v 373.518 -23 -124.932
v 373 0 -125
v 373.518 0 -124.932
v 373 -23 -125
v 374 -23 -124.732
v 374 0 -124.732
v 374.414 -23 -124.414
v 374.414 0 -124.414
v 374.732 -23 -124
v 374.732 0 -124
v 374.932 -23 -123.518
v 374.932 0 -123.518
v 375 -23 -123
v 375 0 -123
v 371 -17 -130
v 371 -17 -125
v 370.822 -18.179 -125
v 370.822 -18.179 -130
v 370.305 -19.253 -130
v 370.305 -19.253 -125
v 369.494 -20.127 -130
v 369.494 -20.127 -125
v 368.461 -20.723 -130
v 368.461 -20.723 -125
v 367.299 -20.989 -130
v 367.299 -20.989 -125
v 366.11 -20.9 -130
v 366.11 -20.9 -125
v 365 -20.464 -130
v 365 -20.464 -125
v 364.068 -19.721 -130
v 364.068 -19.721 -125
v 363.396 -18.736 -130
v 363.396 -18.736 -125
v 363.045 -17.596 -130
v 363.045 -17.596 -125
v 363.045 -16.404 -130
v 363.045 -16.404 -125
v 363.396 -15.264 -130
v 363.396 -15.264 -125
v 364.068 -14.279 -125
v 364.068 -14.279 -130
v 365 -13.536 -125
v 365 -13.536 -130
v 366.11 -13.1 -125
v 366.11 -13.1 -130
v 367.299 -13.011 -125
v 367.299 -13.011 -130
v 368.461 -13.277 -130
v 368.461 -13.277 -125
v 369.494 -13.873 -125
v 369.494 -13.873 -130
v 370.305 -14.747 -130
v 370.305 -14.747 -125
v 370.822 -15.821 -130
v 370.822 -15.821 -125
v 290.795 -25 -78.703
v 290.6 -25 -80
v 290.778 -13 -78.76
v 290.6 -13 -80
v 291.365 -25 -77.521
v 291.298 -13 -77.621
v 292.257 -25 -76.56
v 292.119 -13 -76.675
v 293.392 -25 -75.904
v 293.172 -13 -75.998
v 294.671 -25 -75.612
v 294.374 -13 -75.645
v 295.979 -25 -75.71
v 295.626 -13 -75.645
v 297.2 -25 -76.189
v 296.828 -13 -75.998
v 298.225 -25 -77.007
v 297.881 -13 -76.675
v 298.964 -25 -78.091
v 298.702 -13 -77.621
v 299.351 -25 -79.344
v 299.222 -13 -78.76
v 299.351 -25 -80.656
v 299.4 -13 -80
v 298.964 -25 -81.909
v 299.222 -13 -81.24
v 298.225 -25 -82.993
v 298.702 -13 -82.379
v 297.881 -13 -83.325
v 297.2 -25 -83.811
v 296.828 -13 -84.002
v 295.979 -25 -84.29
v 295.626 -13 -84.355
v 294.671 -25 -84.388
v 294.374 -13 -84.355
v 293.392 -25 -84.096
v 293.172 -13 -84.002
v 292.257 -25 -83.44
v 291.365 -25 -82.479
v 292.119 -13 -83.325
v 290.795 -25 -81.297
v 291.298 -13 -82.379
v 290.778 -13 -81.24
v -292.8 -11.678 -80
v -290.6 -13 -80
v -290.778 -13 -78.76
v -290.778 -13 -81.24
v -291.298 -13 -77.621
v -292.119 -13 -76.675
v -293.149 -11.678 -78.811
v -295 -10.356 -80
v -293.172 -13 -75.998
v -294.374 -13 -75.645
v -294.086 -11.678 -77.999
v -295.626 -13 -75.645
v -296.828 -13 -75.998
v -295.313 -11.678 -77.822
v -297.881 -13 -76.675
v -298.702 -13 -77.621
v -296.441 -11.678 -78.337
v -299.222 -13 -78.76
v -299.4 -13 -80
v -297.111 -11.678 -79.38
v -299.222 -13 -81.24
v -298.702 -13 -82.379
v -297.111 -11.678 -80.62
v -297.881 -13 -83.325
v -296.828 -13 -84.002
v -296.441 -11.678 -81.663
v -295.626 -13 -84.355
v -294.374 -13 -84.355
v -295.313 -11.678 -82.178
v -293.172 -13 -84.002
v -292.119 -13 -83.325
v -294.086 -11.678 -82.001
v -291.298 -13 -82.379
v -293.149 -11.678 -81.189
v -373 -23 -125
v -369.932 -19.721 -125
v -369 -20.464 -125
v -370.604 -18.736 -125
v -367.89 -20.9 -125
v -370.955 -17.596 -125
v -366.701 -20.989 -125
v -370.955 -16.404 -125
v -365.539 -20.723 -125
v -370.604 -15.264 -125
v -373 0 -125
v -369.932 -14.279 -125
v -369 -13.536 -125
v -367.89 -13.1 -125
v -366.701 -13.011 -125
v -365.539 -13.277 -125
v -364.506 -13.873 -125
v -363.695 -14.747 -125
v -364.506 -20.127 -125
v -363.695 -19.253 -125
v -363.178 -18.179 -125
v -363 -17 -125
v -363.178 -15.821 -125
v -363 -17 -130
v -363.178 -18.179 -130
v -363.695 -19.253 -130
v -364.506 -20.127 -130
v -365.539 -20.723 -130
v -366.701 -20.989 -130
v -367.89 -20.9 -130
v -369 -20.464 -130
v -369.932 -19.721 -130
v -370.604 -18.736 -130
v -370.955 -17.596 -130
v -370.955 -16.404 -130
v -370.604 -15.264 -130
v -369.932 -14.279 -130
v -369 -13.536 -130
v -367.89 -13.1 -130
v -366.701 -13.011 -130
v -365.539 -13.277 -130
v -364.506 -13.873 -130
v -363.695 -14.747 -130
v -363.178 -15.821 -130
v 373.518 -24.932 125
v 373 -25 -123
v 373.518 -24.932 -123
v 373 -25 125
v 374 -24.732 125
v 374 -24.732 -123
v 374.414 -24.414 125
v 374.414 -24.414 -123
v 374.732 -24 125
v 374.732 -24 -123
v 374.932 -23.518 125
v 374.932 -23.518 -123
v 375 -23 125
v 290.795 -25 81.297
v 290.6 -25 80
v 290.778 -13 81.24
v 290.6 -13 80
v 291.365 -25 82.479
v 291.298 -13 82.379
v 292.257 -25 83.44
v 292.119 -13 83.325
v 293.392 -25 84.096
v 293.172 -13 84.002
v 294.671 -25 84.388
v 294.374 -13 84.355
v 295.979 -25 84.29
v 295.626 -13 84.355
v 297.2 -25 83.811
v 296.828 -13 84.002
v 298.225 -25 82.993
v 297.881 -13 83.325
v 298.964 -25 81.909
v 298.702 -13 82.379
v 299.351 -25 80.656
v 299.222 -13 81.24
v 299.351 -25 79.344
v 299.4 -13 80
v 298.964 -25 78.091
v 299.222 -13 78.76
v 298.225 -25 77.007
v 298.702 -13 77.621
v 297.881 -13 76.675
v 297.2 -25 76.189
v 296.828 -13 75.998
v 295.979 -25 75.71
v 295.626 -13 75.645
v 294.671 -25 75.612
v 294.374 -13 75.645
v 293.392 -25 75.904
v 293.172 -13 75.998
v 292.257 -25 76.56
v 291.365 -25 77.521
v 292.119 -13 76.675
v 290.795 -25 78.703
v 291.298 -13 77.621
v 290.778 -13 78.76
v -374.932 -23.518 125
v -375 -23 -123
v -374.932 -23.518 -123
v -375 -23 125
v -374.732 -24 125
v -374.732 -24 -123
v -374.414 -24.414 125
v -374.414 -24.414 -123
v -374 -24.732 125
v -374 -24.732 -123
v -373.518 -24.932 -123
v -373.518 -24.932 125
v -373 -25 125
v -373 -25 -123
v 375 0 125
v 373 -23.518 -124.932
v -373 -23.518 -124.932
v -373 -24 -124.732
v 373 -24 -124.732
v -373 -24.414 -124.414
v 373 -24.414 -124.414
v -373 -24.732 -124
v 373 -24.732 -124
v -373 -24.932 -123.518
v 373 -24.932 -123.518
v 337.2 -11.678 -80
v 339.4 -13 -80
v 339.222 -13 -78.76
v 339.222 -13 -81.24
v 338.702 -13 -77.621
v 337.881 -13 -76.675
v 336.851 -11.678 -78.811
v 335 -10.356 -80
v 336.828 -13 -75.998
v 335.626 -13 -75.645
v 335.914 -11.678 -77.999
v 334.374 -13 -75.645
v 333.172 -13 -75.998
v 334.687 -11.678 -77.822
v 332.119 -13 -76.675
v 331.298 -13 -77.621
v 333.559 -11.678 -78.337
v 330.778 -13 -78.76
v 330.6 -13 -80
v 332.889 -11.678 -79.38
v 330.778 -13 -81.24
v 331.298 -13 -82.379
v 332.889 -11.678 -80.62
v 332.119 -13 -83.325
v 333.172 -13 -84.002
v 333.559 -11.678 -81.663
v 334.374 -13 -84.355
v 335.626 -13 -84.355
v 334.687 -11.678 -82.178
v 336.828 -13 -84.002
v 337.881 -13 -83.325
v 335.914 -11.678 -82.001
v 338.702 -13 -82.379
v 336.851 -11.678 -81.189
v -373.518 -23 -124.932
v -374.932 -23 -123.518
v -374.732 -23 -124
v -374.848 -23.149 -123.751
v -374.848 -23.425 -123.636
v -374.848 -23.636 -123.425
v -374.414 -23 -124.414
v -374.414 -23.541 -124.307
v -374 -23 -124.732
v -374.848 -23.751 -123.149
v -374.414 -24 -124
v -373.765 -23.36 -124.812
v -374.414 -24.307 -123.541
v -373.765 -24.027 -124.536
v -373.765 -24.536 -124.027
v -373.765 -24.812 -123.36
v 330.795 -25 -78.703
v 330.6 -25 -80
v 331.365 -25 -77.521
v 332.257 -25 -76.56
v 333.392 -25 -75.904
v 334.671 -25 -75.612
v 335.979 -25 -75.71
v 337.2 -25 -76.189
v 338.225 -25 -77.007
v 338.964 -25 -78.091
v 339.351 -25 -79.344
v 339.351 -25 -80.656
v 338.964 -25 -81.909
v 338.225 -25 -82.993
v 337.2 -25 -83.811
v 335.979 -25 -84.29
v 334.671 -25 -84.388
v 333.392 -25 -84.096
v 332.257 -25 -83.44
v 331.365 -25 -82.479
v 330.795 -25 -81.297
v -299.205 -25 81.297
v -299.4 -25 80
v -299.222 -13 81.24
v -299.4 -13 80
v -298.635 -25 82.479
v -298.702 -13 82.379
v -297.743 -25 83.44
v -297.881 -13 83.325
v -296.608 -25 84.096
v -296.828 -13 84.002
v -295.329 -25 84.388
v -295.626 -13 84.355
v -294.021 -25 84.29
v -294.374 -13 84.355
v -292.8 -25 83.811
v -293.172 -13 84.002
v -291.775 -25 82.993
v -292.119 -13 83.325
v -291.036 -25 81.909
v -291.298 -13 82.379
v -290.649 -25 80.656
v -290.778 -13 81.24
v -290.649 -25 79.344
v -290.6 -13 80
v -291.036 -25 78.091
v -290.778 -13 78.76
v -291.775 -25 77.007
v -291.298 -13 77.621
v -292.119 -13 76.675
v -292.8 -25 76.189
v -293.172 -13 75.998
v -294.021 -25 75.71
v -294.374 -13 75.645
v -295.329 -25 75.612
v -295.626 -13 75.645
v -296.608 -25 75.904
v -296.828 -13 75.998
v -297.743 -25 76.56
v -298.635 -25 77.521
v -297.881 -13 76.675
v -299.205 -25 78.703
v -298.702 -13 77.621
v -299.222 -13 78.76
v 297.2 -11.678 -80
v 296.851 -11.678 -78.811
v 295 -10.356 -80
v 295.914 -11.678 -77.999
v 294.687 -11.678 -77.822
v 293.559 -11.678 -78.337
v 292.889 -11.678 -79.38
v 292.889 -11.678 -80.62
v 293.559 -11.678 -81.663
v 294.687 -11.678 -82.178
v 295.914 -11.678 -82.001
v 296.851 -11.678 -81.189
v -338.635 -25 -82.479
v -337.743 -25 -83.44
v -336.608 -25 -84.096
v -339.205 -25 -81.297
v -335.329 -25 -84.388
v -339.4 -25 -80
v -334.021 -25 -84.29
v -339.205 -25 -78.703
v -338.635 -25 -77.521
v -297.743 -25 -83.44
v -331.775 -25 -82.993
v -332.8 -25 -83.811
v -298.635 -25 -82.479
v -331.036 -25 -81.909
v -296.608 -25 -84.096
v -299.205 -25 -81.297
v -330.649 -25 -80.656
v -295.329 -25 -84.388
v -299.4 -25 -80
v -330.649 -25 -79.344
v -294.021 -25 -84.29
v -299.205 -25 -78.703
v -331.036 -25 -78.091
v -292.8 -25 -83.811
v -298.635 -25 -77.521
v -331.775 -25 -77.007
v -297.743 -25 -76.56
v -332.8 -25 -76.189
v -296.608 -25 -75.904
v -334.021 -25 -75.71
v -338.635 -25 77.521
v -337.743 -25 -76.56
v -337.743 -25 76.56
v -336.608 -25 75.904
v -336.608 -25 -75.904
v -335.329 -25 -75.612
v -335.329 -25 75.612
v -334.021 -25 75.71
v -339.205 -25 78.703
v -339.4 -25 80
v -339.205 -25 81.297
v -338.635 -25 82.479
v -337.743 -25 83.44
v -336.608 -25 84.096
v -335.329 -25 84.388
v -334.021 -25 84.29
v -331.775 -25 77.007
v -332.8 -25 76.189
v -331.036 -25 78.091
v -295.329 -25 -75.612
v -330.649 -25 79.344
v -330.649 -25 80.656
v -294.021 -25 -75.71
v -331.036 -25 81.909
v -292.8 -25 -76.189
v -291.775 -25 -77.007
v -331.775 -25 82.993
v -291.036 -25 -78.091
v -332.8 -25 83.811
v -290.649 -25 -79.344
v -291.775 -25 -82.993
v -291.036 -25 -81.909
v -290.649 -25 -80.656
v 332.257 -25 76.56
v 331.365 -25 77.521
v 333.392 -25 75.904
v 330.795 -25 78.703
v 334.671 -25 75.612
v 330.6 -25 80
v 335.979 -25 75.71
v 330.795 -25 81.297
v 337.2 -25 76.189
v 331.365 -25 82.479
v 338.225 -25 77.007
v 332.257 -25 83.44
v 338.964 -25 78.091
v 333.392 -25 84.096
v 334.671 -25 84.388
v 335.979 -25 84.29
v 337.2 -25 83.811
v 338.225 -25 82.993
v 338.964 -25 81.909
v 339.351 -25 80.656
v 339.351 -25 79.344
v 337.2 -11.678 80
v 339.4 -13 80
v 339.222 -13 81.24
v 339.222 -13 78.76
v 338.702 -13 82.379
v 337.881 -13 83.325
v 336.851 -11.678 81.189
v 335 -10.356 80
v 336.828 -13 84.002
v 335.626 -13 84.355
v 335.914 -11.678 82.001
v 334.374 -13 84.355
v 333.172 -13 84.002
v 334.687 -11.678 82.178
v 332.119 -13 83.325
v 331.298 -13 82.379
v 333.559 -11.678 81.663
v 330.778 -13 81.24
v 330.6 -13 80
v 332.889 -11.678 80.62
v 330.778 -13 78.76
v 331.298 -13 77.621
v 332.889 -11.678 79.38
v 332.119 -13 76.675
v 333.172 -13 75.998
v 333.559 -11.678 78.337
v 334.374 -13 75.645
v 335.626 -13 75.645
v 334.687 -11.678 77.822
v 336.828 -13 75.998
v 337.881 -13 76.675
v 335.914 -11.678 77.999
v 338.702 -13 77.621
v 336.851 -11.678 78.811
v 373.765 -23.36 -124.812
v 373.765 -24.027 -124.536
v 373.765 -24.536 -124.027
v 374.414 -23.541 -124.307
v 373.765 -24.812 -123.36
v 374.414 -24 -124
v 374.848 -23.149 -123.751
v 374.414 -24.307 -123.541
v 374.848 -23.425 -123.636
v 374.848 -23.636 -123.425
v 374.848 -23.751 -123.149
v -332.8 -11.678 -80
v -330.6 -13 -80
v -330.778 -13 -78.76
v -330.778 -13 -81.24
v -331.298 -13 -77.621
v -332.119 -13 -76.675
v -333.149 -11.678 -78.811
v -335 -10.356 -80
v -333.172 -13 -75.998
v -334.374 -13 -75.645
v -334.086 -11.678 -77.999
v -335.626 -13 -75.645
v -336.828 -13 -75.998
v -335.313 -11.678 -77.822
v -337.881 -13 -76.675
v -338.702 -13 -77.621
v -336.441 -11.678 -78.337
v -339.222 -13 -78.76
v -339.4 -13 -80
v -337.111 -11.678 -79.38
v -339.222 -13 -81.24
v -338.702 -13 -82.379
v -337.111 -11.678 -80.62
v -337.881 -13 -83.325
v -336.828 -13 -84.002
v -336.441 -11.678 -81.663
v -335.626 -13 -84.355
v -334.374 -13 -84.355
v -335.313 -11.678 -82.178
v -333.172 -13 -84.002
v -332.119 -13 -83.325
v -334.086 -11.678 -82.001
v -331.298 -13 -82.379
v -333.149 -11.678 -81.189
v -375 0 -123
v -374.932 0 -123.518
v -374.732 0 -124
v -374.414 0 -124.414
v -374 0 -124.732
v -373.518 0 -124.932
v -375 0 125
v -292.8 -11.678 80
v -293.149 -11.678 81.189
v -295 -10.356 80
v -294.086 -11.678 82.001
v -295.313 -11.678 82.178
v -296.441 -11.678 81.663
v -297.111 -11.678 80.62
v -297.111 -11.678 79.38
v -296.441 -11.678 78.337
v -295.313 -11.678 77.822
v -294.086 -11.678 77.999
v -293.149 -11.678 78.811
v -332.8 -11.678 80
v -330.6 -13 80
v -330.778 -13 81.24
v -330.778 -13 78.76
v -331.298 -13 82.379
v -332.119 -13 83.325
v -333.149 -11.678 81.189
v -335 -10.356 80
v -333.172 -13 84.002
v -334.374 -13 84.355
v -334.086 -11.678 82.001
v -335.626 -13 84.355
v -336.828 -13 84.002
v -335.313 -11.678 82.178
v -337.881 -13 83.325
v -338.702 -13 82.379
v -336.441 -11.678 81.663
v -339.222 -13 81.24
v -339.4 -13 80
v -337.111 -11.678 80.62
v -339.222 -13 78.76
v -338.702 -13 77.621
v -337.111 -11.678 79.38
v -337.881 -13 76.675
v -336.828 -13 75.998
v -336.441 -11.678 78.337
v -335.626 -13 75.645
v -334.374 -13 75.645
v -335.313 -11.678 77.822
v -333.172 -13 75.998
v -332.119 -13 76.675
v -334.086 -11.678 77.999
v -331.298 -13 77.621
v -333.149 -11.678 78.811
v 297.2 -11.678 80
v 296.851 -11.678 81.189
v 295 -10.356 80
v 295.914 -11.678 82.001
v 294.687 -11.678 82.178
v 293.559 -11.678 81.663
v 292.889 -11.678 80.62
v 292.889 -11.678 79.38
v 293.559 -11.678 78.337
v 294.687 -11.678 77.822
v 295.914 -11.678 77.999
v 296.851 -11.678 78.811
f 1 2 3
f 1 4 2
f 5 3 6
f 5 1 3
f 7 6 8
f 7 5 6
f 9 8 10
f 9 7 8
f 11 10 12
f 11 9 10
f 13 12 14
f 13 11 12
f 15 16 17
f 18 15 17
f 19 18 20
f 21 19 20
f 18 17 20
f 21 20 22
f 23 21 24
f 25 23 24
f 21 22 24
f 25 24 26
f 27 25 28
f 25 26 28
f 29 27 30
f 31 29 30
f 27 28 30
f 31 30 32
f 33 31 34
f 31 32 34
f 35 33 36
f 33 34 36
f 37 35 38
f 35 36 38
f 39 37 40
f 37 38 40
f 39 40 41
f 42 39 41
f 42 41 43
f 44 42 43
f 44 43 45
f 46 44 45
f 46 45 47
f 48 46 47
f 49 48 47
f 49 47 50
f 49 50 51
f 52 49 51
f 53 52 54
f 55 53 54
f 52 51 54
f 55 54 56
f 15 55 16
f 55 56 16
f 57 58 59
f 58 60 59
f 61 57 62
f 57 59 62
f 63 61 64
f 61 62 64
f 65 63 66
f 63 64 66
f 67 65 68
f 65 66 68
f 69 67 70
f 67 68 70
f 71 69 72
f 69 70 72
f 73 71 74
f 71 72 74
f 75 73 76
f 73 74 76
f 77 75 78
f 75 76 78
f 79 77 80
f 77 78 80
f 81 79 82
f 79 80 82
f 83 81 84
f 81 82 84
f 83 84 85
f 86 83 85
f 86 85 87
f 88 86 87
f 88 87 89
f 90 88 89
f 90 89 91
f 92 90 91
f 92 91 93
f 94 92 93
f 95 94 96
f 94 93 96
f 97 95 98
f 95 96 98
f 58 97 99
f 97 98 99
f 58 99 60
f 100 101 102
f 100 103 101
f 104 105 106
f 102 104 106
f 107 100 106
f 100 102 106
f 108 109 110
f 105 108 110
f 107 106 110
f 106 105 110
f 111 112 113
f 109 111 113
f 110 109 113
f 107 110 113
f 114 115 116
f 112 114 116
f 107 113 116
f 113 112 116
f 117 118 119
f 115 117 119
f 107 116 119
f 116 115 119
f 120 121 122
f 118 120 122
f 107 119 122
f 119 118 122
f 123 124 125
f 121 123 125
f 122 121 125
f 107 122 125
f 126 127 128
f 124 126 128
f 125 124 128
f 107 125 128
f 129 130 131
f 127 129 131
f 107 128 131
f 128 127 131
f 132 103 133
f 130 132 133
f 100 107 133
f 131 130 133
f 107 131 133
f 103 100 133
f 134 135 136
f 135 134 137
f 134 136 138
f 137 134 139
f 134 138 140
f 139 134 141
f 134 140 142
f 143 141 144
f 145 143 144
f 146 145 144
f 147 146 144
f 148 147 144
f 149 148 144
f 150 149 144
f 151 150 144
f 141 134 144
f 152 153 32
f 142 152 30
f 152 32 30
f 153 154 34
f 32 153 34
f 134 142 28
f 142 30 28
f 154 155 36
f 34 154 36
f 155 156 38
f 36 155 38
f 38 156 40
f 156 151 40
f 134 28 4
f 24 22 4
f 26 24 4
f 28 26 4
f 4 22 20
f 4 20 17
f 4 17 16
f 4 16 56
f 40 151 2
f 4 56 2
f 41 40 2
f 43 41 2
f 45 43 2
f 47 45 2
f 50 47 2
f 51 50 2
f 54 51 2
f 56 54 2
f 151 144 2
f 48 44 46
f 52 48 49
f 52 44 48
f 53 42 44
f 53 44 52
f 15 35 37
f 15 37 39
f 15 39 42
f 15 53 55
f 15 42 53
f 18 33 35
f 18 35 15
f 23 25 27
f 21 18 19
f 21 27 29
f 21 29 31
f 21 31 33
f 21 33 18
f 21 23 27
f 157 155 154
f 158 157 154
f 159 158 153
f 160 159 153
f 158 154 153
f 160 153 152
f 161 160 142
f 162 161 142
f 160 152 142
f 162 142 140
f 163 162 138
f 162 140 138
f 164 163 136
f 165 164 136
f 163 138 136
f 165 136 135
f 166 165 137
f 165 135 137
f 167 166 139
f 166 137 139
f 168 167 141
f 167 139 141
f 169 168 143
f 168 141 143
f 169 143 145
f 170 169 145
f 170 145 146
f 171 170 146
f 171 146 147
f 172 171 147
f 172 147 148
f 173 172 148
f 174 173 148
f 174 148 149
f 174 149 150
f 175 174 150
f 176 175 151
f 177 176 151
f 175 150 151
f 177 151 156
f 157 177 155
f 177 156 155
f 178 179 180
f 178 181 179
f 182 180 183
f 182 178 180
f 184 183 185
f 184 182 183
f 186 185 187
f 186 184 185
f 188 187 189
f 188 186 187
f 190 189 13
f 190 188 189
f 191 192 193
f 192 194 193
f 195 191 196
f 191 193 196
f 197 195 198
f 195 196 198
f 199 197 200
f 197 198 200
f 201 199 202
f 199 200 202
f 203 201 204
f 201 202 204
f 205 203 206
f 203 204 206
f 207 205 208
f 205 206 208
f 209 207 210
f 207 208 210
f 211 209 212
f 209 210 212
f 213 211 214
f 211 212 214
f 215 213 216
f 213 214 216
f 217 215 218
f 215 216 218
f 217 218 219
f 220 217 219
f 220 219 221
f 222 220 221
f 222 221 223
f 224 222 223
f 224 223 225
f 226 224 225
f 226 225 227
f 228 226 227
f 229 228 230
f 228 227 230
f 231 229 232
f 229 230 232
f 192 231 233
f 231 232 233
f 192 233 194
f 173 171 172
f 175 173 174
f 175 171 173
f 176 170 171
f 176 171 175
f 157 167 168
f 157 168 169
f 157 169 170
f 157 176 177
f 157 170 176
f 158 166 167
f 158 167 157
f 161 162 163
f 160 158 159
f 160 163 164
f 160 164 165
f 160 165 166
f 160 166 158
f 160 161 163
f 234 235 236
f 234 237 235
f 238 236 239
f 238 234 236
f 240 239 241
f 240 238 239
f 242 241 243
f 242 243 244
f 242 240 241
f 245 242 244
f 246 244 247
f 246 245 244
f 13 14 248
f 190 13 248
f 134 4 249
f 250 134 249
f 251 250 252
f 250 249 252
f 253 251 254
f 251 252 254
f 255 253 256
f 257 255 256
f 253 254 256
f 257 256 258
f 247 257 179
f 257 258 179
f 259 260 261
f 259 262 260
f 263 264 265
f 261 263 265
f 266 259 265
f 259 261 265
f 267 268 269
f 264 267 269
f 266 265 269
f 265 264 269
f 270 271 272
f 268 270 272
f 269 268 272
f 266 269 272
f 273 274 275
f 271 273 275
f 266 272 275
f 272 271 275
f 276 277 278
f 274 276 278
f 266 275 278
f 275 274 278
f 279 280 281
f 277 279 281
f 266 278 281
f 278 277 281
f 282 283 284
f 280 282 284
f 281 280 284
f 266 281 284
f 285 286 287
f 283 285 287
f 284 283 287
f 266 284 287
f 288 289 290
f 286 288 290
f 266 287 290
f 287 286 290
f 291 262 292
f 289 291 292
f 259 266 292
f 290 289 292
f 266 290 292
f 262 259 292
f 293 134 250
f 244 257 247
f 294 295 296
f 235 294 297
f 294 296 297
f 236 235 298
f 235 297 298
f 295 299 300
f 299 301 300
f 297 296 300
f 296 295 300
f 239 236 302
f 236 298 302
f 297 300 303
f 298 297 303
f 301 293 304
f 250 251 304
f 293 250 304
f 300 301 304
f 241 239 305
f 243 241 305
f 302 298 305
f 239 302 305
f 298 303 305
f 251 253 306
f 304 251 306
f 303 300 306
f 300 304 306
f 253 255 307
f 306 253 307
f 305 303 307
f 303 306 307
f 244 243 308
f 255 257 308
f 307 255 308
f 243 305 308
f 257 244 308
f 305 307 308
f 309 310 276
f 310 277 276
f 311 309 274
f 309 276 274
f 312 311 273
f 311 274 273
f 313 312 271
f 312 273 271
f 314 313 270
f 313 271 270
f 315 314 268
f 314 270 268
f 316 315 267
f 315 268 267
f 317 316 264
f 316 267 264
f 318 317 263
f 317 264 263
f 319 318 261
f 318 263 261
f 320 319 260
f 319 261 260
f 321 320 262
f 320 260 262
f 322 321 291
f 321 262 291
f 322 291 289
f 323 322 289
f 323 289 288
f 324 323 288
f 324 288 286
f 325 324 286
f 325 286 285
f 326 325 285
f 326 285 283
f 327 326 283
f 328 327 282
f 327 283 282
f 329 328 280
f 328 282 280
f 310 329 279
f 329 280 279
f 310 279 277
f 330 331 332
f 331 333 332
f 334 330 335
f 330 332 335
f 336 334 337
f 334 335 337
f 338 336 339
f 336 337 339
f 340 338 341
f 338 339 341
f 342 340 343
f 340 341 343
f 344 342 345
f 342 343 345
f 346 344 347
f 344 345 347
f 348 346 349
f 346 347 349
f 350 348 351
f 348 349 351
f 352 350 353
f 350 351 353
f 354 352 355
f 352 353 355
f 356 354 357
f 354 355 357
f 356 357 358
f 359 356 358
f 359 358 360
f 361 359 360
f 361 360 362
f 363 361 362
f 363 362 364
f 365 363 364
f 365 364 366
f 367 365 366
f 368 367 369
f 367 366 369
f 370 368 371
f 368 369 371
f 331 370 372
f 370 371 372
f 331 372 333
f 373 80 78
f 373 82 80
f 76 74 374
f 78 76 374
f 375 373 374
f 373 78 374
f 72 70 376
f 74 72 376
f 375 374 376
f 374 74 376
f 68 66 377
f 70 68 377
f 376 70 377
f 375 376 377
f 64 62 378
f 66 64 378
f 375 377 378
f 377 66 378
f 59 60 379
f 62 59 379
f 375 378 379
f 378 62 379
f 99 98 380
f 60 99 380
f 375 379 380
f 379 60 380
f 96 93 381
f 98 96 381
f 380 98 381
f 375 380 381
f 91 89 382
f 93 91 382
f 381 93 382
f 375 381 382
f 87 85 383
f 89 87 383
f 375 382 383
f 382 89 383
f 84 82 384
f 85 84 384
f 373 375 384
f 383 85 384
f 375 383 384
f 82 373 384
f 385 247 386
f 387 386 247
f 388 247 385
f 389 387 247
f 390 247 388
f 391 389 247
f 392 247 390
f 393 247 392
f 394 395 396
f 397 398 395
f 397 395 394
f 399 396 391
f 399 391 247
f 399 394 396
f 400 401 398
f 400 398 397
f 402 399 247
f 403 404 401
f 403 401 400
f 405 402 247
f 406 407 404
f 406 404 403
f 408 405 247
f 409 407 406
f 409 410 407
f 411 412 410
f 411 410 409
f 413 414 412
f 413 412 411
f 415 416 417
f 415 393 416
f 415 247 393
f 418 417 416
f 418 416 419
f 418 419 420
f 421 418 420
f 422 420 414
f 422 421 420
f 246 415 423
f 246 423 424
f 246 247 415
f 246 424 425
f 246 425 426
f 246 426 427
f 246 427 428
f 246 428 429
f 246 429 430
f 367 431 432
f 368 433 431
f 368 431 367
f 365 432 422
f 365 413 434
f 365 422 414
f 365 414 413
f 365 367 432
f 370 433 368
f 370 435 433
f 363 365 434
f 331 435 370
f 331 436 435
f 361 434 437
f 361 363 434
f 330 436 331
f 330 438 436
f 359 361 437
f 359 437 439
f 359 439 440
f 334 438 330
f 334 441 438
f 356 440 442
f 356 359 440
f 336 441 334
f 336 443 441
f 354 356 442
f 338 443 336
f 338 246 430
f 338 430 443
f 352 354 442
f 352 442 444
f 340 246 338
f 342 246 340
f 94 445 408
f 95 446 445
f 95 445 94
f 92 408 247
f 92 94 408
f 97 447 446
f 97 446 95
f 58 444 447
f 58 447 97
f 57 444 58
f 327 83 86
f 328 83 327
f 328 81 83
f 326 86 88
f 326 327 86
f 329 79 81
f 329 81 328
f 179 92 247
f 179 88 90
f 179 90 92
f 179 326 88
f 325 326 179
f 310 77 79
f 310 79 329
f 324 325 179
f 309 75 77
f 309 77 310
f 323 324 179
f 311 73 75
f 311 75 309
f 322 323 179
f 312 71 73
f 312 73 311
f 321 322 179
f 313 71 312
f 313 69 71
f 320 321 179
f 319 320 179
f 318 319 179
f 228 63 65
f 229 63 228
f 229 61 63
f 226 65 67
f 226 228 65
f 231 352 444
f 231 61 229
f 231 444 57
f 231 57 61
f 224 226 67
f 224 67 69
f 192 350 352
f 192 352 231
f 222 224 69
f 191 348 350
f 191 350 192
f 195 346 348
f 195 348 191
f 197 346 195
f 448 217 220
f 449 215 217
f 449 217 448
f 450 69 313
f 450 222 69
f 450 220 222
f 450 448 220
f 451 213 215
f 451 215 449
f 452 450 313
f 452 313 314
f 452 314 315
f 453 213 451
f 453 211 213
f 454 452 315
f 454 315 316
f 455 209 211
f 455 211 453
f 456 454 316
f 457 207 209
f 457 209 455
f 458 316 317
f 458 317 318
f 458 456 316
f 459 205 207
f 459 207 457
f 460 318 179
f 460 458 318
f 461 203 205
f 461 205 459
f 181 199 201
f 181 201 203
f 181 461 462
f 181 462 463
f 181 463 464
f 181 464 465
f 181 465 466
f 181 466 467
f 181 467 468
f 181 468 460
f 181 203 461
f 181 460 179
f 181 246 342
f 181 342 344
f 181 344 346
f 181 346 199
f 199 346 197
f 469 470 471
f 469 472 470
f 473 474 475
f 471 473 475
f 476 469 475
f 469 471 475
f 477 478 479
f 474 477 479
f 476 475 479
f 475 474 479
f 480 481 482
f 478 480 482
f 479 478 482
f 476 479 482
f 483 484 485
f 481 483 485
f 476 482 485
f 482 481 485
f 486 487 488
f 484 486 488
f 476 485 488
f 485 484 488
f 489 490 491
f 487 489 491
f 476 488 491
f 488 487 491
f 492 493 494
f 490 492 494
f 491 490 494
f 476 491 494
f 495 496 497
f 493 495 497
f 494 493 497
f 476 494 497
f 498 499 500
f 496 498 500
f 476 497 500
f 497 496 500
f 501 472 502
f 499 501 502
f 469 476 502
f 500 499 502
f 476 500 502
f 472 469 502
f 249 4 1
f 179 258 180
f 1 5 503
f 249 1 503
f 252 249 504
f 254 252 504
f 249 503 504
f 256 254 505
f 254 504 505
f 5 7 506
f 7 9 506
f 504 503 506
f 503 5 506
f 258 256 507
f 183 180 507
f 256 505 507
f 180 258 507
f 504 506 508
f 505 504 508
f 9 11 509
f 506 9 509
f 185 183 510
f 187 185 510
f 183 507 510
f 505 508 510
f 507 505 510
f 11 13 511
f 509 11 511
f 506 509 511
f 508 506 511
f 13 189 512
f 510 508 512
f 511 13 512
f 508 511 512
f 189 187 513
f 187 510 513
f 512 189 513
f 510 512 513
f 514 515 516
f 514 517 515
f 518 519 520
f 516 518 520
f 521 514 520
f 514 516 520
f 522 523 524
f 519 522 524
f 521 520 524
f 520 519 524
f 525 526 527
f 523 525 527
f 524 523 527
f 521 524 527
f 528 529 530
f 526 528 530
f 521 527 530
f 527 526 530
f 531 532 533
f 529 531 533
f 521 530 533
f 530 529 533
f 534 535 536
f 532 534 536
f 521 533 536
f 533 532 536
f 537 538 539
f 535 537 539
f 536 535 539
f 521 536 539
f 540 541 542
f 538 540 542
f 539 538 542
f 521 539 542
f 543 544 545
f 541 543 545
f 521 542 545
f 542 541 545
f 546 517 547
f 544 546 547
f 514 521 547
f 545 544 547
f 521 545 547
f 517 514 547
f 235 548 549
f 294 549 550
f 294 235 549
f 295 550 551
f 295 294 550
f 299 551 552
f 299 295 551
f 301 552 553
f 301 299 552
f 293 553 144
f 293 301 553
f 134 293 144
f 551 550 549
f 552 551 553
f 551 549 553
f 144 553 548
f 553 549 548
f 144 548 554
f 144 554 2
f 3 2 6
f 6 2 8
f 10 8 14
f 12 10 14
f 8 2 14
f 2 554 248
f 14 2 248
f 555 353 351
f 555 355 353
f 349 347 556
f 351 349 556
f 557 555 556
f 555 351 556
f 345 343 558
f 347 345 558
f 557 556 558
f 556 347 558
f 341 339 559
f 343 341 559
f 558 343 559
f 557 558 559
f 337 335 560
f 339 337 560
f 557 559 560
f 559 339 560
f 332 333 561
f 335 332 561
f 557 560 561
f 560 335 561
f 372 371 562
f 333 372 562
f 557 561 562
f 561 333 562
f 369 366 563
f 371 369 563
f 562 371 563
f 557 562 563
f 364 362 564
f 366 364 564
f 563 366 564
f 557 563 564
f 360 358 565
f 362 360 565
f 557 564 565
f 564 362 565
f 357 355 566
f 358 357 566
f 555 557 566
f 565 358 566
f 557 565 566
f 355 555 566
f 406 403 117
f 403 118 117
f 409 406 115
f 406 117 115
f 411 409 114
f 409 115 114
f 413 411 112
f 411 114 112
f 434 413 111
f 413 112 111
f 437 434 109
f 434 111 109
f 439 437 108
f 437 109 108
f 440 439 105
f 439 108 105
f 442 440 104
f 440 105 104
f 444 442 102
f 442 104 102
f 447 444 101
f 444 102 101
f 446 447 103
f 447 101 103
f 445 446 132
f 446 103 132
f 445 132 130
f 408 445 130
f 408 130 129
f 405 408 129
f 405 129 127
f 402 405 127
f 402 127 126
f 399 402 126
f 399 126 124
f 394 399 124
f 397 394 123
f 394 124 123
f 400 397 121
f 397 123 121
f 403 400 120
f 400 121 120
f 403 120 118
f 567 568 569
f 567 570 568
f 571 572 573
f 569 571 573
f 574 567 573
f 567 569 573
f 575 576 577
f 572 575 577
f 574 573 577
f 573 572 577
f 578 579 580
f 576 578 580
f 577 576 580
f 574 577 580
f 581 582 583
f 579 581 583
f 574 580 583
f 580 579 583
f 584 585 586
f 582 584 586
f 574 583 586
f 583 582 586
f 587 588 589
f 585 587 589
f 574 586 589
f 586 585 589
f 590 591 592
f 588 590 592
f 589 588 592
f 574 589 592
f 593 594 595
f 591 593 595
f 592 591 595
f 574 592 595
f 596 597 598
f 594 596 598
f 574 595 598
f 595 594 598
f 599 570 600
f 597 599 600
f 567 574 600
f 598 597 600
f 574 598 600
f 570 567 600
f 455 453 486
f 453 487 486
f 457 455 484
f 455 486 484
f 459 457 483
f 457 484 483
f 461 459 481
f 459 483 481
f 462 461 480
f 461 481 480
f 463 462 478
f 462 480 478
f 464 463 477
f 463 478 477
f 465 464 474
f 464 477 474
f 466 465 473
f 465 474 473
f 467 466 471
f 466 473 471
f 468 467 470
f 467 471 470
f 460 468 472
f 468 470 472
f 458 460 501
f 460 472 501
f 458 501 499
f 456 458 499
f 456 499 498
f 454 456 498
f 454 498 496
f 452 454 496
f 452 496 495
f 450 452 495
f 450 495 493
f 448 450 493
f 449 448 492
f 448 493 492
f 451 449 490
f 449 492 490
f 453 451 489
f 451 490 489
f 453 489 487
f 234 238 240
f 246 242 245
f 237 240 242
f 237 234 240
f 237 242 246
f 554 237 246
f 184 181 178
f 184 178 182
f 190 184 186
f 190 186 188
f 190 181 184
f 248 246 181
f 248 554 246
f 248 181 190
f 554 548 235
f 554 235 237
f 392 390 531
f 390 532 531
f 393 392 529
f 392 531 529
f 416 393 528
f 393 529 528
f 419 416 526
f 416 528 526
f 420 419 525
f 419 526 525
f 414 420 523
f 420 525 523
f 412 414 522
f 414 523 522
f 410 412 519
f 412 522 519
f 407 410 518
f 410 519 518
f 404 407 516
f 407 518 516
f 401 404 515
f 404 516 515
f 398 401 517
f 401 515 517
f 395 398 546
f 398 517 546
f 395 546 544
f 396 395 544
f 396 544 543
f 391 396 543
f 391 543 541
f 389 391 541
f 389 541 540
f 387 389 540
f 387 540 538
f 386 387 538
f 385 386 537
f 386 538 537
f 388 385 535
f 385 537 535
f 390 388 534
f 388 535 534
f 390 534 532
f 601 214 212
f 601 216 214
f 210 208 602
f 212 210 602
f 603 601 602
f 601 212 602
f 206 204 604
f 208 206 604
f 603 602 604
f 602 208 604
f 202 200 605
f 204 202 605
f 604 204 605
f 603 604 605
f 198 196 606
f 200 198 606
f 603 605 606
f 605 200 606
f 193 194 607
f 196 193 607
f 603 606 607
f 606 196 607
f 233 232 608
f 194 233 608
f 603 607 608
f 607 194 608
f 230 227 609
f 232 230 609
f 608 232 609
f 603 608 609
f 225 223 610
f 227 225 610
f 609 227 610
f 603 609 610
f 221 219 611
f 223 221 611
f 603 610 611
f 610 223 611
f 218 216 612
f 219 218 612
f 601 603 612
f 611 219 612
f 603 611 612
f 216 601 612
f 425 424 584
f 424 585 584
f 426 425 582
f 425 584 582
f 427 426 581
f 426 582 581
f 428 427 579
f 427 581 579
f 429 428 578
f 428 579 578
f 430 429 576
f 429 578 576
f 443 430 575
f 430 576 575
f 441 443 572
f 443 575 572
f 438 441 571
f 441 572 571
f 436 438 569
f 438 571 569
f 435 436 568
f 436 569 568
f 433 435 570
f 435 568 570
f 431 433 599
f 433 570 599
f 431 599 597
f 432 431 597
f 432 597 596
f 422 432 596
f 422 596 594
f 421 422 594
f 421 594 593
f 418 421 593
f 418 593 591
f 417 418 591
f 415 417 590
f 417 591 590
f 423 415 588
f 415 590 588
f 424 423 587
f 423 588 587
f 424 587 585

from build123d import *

# Parameters (mm, degrees)
F0_W     = 750
F0_H     = 250
F1_DEPTH = 25
F2_R     = 4
F3_DEPTH = 5
F4_R     = 2
F5_R     = 2
F7_D     = 8.8
F7_DEPTH = 12
F7_TIP   = 2.6437867237


with BuildPart() as f1:
    # F0 (on Front) → F1 (new body)
    with BuildSketch(Plane.XZ):
        Rectangle(F0_W, F0_H)
    extrude(amount=F1_DEPTH)

    # F2 (on face) → F3 (join)
    with BuildSketch(Plane(origin=(0, 0, -125), x_dir=(1, 0, 0), z_dir=(0, 0, -1))):
        with Locations((-367, 17)):
            Circle(F2_R)
        with Locations((367, 17)):
            Circle(F2_R)
    extrude(amount=F3_DEPTH)

    # F4
    f4_edges = [f1.edges().sort_by_distance(p)[0] for p in [
        (0, -25, -125),
    ]]
    fillet(f4_edges, radius=F4_R)

    # F5
    f5_edges = [f1.edges().sort_by_distance(p)[0] for p in [
        (-375, -11.5, -125),
        (375, -11.5, -125),
    ]]
    fillet(f5_edges, radius=F5_R)

    # F7
    with Locations(Plane.XZ.offset(25)):
        with Locations((-335, 80), (-295, 80), (-295, -80), (-335, -80), (295, 80), (335, 80), (295, -80), (335, -80)):
            Hole(F7_D / 2, depth=F7_DEPTH)
            with Locations((0, 0, -(F7_DEPTH + F7_TIP / 2))):  # 118° drill point
                Cone(0, F7_D / 2, F7_TIP, mode=Mode.SUBTRACT)


solid = f1.part
